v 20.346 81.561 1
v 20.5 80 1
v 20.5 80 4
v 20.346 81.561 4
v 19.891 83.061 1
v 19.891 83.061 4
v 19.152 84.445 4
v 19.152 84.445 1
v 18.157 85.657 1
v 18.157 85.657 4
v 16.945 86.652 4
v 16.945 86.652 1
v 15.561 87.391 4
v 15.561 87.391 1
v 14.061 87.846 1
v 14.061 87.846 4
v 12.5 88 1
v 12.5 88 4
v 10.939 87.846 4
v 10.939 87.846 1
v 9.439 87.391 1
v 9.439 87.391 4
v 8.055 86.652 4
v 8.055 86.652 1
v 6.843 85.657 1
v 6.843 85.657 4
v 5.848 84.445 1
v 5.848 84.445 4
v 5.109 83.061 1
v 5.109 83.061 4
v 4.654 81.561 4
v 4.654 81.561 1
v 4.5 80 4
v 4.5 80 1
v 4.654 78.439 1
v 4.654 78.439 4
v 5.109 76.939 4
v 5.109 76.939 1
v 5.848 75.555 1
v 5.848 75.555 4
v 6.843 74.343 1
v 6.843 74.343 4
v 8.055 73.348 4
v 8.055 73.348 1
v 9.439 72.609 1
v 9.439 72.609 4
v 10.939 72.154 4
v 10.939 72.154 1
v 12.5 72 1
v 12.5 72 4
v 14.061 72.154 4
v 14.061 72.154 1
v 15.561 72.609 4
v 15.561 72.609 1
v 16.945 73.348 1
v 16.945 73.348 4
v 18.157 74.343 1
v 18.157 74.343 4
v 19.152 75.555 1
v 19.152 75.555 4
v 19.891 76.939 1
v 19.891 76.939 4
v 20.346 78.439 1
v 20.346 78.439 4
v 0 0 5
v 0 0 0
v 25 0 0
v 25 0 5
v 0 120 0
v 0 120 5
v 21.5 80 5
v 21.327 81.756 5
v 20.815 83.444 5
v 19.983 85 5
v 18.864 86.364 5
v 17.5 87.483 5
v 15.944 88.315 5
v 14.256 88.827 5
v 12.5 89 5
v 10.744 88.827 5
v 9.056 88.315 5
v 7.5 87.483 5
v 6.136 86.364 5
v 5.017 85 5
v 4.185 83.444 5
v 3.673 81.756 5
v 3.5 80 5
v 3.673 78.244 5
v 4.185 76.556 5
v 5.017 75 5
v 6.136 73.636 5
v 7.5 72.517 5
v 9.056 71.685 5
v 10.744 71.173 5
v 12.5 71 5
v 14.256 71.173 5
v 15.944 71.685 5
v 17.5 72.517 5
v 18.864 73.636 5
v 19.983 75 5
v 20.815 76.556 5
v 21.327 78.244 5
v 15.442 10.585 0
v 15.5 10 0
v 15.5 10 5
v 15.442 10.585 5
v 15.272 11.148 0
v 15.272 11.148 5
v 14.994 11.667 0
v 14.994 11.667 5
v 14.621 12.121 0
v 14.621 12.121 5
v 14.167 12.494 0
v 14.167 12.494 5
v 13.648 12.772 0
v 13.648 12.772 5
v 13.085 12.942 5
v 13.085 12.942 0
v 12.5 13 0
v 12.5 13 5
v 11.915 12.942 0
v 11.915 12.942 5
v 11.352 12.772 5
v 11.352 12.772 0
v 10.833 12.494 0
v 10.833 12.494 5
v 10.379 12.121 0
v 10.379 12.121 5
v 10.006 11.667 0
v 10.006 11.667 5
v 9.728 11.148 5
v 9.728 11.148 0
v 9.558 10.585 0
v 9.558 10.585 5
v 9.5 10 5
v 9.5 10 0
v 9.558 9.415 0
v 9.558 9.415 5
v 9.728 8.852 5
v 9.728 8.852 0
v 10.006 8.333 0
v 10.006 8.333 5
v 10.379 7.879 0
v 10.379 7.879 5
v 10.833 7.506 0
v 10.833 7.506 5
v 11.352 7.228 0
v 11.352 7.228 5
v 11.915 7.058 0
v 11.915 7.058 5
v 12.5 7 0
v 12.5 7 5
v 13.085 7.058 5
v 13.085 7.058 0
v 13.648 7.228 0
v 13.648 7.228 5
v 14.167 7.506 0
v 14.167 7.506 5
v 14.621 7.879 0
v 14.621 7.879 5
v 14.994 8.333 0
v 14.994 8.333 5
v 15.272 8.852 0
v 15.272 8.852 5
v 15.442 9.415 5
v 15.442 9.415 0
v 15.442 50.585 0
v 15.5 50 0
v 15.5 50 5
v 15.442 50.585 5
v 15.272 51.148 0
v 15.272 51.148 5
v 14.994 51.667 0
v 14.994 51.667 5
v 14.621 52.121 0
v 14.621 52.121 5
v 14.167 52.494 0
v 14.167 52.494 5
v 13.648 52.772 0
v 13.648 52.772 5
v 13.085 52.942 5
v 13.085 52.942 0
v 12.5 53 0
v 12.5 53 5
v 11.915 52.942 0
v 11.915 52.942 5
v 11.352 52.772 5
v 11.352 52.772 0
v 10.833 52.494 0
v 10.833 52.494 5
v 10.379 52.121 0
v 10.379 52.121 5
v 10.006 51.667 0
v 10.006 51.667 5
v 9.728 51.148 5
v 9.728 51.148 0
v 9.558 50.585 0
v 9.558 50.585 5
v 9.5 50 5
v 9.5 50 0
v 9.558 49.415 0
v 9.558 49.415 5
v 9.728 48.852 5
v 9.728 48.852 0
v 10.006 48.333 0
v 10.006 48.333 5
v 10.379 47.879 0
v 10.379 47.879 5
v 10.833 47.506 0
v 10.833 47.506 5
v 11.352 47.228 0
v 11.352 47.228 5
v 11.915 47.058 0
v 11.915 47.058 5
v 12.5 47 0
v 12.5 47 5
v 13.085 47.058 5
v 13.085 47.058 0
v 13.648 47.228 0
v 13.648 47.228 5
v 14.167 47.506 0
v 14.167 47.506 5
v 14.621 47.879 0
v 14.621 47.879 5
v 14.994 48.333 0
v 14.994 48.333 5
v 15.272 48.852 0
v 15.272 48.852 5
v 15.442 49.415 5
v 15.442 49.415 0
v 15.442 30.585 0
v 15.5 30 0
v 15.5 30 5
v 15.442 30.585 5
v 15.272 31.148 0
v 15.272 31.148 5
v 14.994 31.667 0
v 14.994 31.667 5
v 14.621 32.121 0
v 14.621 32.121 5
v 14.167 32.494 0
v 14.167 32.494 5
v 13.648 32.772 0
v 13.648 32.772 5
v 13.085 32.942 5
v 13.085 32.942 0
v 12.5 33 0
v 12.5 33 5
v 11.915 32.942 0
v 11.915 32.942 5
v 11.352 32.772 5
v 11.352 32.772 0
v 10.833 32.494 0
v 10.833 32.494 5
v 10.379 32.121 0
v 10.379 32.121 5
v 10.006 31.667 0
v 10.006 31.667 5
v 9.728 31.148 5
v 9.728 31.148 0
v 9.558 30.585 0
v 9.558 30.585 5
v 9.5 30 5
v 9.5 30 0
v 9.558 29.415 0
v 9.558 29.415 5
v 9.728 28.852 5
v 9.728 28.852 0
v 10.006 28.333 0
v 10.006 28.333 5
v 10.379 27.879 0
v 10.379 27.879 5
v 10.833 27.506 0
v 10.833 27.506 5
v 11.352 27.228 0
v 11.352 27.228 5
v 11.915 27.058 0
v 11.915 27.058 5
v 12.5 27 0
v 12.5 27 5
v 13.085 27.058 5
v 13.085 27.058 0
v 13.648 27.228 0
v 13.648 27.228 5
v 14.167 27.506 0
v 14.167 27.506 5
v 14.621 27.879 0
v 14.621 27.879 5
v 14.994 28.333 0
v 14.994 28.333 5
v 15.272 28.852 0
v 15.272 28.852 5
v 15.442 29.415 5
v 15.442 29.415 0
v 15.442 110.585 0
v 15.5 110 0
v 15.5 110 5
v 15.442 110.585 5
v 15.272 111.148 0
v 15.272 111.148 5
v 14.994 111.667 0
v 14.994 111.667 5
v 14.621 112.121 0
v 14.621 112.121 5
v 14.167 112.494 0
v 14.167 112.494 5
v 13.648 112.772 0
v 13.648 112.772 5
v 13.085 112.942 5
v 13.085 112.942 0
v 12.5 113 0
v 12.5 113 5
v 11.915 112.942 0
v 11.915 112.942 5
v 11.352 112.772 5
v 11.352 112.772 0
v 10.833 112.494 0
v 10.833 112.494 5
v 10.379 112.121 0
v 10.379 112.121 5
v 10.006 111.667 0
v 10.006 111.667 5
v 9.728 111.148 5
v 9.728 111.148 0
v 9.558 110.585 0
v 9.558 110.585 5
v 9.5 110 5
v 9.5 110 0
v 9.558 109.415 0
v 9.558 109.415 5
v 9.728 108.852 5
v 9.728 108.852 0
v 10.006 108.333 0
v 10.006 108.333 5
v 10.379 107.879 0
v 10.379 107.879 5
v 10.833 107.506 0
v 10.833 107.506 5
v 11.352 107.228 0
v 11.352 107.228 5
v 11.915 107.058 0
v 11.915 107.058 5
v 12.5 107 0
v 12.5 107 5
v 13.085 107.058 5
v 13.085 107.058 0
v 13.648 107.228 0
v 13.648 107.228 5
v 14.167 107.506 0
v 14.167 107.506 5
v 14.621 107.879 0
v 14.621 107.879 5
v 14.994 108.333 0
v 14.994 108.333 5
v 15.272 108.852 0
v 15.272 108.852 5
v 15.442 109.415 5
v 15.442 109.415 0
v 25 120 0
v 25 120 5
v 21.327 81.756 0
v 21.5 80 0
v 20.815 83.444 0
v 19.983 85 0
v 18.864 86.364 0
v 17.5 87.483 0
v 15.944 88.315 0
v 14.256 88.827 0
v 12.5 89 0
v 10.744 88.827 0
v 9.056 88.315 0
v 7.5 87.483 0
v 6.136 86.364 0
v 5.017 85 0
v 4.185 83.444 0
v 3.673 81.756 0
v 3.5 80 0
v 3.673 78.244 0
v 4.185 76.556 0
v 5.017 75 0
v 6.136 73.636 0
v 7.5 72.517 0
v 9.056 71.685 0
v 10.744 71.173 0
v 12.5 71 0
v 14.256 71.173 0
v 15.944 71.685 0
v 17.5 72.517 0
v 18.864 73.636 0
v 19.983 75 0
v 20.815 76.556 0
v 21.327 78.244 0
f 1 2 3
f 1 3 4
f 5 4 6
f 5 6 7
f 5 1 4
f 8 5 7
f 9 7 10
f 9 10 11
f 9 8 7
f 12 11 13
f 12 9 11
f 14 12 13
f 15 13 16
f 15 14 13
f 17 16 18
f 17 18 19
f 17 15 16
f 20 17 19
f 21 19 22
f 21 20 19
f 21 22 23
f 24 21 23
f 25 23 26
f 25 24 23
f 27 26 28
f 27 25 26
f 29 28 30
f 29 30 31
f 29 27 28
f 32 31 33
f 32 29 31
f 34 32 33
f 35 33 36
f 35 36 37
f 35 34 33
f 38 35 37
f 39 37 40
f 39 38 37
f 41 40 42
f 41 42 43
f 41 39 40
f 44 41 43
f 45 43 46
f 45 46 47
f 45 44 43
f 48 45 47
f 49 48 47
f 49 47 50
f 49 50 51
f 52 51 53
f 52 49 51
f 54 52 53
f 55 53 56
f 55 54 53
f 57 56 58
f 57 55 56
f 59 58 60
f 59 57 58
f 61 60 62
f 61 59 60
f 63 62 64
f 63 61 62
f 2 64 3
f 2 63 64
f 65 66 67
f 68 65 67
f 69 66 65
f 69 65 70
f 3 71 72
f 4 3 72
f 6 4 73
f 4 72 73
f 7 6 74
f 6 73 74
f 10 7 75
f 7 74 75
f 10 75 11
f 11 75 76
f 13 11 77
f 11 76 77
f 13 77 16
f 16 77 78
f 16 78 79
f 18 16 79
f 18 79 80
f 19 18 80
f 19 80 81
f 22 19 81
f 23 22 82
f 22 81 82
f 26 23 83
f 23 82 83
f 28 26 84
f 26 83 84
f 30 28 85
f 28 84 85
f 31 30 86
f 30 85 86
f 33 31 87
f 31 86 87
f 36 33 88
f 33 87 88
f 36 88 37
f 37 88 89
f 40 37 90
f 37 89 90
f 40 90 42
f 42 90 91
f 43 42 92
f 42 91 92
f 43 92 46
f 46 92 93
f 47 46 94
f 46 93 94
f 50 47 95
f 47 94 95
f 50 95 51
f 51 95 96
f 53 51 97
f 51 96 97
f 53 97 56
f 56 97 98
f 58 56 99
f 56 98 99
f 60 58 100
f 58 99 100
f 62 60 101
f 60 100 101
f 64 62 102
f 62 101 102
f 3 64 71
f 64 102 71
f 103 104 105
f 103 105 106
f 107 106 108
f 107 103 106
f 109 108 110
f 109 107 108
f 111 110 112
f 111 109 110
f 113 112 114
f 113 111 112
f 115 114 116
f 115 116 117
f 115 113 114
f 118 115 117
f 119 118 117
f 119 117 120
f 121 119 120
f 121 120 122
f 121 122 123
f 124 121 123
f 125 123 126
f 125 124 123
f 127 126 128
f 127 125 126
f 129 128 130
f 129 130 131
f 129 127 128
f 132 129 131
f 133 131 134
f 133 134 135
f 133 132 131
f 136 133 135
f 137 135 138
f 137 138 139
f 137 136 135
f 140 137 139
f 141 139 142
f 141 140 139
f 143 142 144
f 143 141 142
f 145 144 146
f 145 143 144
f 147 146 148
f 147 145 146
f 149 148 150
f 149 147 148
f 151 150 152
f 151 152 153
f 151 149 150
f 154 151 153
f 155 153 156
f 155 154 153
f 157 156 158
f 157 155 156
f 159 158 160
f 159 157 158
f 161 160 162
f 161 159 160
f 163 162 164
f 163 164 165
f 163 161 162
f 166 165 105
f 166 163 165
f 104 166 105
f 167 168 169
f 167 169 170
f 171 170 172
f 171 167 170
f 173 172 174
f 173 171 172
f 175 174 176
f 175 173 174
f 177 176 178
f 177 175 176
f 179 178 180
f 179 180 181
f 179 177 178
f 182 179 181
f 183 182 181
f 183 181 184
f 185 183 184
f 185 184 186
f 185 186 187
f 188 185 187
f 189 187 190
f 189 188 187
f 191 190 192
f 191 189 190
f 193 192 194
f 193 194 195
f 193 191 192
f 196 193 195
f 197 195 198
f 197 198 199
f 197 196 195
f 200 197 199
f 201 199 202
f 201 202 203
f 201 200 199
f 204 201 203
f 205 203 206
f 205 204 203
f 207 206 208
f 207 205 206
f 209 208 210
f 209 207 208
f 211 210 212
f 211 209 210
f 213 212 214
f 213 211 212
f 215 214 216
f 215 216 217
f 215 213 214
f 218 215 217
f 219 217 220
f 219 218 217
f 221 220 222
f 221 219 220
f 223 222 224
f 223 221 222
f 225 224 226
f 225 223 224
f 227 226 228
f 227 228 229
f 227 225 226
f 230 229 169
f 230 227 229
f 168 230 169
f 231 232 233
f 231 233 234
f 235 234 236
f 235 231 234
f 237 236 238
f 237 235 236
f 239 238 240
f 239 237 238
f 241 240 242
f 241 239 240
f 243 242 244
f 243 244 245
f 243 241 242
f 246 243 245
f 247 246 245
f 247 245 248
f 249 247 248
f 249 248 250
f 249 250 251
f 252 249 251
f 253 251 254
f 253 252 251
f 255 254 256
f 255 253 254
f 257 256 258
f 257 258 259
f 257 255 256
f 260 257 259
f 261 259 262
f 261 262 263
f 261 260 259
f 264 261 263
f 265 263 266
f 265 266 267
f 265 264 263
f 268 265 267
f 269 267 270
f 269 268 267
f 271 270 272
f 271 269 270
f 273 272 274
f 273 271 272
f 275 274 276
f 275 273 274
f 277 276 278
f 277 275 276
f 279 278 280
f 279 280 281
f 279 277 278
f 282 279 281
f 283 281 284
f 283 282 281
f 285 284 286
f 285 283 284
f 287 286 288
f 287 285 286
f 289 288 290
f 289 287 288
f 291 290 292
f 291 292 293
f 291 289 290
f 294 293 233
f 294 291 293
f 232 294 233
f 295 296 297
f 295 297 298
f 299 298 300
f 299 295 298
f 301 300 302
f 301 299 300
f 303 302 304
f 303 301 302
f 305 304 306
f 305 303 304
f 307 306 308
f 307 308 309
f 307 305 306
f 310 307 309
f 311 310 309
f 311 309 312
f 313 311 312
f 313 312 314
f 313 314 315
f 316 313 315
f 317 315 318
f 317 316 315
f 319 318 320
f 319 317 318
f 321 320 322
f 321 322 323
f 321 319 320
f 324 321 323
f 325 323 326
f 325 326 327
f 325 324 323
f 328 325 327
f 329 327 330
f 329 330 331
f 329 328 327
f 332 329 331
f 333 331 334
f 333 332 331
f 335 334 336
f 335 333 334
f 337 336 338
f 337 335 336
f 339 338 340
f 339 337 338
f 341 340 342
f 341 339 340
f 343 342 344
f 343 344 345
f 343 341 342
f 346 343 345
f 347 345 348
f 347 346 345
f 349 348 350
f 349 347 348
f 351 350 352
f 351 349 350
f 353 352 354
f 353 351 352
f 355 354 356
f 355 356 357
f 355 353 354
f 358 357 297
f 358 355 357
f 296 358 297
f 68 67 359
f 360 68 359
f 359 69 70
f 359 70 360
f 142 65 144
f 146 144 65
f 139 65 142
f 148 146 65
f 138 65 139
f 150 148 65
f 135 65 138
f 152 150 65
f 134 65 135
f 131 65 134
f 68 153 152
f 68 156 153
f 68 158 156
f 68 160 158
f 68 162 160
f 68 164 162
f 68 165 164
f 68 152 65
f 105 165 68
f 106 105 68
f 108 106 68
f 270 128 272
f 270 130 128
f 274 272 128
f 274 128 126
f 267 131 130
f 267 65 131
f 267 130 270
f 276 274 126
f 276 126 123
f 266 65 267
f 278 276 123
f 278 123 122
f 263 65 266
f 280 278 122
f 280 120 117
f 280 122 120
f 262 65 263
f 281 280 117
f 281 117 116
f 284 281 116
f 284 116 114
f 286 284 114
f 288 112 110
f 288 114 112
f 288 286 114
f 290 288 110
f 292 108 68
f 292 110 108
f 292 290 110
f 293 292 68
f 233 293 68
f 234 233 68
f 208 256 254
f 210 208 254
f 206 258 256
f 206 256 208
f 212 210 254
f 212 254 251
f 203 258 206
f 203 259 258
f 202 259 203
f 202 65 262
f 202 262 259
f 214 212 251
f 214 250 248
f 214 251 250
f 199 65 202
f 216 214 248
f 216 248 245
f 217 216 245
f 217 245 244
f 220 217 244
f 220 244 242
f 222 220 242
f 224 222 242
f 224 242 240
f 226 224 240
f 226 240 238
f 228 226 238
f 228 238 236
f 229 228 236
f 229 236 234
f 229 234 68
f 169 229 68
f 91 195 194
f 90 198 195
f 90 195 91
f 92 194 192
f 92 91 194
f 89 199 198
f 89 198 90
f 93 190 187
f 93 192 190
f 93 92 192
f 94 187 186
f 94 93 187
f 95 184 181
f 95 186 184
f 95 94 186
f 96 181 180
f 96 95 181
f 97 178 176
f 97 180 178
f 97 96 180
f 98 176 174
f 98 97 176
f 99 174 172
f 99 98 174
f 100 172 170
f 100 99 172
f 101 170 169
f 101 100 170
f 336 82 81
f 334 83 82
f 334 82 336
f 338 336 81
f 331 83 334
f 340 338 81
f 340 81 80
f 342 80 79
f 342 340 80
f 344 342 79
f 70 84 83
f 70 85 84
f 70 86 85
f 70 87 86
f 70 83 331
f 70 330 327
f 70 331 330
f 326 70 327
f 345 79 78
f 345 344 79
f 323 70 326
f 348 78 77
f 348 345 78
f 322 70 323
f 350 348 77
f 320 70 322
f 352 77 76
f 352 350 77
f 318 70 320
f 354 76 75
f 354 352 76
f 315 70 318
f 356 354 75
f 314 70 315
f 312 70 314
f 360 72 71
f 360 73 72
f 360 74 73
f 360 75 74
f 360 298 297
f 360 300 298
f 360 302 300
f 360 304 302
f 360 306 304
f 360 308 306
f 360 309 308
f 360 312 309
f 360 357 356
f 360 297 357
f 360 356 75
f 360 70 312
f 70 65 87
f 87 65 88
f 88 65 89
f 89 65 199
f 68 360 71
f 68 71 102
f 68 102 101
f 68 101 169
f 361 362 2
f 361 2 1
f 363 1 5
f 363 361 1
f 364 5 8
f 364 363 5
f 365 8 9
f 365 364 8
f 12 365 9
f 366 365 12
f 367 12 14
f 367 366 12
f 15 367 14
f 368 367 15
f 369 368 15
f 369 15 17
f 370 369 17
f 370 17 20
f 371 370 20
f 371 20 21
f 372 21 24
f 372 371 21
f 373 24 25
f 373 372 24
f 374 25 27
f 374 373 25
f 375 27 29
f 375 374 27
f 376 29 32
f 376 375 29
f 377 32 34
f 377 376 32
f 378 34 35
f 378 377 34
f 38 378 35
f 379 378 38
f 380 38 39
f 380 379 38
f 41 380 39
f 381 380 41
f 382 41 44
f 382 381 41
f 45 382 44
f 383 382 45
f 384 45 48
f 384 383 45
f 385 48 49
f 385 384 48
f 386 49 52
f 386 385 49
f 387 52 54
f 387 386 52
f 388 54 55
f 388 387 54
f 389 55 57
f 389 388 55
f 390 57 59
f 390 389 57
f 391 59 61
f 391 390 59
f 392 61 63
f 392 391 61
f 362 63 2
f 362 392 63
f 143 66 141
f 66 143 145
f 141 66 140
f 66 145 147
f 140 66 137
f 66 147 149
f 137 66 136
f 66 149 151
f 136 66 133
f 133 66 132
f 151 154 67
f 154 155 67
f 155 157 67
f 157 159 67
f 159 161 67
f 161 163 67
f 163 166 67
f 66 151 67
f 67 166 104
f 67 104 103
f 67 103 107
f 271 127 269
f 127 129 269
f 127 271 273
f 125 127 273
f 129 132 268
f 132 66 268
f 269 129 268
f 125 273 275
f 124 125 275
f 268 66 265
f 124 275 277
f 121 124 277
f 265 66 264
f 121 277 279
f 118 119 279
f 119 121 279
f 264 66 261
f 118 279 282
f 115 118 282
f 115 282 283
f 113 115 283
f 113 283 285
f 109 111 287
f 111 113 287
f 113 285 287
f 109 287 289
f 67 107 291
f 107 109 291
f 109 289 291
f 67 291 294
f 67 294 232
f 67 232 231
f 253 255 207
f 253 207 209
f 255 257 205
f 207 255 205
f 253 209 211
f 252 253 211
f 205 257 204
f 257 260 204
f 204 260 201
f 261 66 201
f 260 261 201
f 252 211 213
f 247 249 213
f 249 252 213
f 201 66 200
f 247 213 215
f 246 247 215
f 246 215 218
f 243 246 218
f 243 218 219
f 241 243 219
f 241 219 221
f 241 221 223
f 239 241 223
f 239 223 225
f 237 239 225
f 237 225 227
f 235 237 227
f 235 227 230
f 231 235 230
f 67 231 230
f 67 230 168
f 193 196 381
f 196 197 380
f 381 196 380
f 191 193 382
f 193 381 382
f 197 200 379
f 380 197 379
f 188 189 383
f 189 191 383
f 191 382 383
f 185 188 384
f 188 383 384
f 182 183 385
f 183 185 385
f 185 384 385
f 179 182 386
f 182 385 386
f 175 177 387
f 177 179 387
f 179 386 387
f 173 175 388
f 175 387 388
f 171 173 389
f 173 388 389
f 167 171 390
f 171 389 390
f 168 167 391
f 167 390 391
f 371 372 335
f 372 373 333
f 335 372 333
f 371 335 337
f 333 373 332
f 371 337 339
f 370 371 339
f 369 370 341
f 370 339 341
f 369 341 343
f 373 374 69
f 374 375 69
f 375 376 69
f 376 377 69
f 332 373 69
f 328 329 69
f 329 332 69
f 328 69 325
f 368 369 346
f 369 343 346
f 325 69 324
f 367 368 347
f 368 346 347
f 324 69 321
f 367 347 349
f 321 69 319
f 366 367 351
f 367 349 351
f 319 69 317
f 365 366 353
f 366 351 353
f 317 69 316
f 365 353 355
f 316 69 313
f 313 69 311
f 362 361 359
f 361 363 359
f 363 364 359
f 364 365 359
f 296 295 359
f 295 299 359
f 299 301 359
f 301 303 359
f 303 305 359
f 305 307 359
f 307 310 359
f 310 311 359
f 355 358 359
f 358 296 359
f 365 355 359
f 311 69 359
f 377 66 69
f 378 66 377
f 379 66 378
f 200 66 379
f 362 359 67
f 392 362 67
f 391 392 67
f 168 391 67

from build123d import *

# Parameters (mm, degrees)
SKETCH1_W           = 25
SKETCH1_H           = 120
SKETCH1_R           = 3
SKETCH1_R_2         = 8
BOSS_EXTRUDE1_DEPTH = 5
CHAMFER1_SIZE       = 1


with BuildPart() as part:
    # Sketch1 → Boss-Extrude1 (new body)
    with BuildSketch(Plane.XY):
        with Locations((12.5, 60)):
            Rectangle(SKETCH1_W, SKETCH1_H)
        with Locations((12.5, 110)):
            Circle(SKETCH1_R, mode=Mode.SUBTRACT)
        with Locations((12.5, 80)):
            Circle(SKETCH1_R_2, mode=Mode.SUBTRACT)
        with Locations((12.5, 50)):
            Circle(SKETCH1_R, mode=Mode.SUBTRACT)
        with Locations((12.5, 30)):
            Circle(SKETCH1_R, mode=Mode.SUBTRACT)
        with Locations((12.5, 10)):
            Circle(SKETCH1_R, mode=Mode.SUBTRACT)
    extrude(amount=BOSS_EXTRUDE1_DEPTH)

    # Chamfer1
    chamfer1_edges = [part.edges().sort_by_distance(p)[0] for p in [
        (4.5, 80, 0),
        (4.5, 80, 5),
    ]]
    chamfer(chamfer1_edges, length=CHAMFER1_SIZE)


solid = part.part
